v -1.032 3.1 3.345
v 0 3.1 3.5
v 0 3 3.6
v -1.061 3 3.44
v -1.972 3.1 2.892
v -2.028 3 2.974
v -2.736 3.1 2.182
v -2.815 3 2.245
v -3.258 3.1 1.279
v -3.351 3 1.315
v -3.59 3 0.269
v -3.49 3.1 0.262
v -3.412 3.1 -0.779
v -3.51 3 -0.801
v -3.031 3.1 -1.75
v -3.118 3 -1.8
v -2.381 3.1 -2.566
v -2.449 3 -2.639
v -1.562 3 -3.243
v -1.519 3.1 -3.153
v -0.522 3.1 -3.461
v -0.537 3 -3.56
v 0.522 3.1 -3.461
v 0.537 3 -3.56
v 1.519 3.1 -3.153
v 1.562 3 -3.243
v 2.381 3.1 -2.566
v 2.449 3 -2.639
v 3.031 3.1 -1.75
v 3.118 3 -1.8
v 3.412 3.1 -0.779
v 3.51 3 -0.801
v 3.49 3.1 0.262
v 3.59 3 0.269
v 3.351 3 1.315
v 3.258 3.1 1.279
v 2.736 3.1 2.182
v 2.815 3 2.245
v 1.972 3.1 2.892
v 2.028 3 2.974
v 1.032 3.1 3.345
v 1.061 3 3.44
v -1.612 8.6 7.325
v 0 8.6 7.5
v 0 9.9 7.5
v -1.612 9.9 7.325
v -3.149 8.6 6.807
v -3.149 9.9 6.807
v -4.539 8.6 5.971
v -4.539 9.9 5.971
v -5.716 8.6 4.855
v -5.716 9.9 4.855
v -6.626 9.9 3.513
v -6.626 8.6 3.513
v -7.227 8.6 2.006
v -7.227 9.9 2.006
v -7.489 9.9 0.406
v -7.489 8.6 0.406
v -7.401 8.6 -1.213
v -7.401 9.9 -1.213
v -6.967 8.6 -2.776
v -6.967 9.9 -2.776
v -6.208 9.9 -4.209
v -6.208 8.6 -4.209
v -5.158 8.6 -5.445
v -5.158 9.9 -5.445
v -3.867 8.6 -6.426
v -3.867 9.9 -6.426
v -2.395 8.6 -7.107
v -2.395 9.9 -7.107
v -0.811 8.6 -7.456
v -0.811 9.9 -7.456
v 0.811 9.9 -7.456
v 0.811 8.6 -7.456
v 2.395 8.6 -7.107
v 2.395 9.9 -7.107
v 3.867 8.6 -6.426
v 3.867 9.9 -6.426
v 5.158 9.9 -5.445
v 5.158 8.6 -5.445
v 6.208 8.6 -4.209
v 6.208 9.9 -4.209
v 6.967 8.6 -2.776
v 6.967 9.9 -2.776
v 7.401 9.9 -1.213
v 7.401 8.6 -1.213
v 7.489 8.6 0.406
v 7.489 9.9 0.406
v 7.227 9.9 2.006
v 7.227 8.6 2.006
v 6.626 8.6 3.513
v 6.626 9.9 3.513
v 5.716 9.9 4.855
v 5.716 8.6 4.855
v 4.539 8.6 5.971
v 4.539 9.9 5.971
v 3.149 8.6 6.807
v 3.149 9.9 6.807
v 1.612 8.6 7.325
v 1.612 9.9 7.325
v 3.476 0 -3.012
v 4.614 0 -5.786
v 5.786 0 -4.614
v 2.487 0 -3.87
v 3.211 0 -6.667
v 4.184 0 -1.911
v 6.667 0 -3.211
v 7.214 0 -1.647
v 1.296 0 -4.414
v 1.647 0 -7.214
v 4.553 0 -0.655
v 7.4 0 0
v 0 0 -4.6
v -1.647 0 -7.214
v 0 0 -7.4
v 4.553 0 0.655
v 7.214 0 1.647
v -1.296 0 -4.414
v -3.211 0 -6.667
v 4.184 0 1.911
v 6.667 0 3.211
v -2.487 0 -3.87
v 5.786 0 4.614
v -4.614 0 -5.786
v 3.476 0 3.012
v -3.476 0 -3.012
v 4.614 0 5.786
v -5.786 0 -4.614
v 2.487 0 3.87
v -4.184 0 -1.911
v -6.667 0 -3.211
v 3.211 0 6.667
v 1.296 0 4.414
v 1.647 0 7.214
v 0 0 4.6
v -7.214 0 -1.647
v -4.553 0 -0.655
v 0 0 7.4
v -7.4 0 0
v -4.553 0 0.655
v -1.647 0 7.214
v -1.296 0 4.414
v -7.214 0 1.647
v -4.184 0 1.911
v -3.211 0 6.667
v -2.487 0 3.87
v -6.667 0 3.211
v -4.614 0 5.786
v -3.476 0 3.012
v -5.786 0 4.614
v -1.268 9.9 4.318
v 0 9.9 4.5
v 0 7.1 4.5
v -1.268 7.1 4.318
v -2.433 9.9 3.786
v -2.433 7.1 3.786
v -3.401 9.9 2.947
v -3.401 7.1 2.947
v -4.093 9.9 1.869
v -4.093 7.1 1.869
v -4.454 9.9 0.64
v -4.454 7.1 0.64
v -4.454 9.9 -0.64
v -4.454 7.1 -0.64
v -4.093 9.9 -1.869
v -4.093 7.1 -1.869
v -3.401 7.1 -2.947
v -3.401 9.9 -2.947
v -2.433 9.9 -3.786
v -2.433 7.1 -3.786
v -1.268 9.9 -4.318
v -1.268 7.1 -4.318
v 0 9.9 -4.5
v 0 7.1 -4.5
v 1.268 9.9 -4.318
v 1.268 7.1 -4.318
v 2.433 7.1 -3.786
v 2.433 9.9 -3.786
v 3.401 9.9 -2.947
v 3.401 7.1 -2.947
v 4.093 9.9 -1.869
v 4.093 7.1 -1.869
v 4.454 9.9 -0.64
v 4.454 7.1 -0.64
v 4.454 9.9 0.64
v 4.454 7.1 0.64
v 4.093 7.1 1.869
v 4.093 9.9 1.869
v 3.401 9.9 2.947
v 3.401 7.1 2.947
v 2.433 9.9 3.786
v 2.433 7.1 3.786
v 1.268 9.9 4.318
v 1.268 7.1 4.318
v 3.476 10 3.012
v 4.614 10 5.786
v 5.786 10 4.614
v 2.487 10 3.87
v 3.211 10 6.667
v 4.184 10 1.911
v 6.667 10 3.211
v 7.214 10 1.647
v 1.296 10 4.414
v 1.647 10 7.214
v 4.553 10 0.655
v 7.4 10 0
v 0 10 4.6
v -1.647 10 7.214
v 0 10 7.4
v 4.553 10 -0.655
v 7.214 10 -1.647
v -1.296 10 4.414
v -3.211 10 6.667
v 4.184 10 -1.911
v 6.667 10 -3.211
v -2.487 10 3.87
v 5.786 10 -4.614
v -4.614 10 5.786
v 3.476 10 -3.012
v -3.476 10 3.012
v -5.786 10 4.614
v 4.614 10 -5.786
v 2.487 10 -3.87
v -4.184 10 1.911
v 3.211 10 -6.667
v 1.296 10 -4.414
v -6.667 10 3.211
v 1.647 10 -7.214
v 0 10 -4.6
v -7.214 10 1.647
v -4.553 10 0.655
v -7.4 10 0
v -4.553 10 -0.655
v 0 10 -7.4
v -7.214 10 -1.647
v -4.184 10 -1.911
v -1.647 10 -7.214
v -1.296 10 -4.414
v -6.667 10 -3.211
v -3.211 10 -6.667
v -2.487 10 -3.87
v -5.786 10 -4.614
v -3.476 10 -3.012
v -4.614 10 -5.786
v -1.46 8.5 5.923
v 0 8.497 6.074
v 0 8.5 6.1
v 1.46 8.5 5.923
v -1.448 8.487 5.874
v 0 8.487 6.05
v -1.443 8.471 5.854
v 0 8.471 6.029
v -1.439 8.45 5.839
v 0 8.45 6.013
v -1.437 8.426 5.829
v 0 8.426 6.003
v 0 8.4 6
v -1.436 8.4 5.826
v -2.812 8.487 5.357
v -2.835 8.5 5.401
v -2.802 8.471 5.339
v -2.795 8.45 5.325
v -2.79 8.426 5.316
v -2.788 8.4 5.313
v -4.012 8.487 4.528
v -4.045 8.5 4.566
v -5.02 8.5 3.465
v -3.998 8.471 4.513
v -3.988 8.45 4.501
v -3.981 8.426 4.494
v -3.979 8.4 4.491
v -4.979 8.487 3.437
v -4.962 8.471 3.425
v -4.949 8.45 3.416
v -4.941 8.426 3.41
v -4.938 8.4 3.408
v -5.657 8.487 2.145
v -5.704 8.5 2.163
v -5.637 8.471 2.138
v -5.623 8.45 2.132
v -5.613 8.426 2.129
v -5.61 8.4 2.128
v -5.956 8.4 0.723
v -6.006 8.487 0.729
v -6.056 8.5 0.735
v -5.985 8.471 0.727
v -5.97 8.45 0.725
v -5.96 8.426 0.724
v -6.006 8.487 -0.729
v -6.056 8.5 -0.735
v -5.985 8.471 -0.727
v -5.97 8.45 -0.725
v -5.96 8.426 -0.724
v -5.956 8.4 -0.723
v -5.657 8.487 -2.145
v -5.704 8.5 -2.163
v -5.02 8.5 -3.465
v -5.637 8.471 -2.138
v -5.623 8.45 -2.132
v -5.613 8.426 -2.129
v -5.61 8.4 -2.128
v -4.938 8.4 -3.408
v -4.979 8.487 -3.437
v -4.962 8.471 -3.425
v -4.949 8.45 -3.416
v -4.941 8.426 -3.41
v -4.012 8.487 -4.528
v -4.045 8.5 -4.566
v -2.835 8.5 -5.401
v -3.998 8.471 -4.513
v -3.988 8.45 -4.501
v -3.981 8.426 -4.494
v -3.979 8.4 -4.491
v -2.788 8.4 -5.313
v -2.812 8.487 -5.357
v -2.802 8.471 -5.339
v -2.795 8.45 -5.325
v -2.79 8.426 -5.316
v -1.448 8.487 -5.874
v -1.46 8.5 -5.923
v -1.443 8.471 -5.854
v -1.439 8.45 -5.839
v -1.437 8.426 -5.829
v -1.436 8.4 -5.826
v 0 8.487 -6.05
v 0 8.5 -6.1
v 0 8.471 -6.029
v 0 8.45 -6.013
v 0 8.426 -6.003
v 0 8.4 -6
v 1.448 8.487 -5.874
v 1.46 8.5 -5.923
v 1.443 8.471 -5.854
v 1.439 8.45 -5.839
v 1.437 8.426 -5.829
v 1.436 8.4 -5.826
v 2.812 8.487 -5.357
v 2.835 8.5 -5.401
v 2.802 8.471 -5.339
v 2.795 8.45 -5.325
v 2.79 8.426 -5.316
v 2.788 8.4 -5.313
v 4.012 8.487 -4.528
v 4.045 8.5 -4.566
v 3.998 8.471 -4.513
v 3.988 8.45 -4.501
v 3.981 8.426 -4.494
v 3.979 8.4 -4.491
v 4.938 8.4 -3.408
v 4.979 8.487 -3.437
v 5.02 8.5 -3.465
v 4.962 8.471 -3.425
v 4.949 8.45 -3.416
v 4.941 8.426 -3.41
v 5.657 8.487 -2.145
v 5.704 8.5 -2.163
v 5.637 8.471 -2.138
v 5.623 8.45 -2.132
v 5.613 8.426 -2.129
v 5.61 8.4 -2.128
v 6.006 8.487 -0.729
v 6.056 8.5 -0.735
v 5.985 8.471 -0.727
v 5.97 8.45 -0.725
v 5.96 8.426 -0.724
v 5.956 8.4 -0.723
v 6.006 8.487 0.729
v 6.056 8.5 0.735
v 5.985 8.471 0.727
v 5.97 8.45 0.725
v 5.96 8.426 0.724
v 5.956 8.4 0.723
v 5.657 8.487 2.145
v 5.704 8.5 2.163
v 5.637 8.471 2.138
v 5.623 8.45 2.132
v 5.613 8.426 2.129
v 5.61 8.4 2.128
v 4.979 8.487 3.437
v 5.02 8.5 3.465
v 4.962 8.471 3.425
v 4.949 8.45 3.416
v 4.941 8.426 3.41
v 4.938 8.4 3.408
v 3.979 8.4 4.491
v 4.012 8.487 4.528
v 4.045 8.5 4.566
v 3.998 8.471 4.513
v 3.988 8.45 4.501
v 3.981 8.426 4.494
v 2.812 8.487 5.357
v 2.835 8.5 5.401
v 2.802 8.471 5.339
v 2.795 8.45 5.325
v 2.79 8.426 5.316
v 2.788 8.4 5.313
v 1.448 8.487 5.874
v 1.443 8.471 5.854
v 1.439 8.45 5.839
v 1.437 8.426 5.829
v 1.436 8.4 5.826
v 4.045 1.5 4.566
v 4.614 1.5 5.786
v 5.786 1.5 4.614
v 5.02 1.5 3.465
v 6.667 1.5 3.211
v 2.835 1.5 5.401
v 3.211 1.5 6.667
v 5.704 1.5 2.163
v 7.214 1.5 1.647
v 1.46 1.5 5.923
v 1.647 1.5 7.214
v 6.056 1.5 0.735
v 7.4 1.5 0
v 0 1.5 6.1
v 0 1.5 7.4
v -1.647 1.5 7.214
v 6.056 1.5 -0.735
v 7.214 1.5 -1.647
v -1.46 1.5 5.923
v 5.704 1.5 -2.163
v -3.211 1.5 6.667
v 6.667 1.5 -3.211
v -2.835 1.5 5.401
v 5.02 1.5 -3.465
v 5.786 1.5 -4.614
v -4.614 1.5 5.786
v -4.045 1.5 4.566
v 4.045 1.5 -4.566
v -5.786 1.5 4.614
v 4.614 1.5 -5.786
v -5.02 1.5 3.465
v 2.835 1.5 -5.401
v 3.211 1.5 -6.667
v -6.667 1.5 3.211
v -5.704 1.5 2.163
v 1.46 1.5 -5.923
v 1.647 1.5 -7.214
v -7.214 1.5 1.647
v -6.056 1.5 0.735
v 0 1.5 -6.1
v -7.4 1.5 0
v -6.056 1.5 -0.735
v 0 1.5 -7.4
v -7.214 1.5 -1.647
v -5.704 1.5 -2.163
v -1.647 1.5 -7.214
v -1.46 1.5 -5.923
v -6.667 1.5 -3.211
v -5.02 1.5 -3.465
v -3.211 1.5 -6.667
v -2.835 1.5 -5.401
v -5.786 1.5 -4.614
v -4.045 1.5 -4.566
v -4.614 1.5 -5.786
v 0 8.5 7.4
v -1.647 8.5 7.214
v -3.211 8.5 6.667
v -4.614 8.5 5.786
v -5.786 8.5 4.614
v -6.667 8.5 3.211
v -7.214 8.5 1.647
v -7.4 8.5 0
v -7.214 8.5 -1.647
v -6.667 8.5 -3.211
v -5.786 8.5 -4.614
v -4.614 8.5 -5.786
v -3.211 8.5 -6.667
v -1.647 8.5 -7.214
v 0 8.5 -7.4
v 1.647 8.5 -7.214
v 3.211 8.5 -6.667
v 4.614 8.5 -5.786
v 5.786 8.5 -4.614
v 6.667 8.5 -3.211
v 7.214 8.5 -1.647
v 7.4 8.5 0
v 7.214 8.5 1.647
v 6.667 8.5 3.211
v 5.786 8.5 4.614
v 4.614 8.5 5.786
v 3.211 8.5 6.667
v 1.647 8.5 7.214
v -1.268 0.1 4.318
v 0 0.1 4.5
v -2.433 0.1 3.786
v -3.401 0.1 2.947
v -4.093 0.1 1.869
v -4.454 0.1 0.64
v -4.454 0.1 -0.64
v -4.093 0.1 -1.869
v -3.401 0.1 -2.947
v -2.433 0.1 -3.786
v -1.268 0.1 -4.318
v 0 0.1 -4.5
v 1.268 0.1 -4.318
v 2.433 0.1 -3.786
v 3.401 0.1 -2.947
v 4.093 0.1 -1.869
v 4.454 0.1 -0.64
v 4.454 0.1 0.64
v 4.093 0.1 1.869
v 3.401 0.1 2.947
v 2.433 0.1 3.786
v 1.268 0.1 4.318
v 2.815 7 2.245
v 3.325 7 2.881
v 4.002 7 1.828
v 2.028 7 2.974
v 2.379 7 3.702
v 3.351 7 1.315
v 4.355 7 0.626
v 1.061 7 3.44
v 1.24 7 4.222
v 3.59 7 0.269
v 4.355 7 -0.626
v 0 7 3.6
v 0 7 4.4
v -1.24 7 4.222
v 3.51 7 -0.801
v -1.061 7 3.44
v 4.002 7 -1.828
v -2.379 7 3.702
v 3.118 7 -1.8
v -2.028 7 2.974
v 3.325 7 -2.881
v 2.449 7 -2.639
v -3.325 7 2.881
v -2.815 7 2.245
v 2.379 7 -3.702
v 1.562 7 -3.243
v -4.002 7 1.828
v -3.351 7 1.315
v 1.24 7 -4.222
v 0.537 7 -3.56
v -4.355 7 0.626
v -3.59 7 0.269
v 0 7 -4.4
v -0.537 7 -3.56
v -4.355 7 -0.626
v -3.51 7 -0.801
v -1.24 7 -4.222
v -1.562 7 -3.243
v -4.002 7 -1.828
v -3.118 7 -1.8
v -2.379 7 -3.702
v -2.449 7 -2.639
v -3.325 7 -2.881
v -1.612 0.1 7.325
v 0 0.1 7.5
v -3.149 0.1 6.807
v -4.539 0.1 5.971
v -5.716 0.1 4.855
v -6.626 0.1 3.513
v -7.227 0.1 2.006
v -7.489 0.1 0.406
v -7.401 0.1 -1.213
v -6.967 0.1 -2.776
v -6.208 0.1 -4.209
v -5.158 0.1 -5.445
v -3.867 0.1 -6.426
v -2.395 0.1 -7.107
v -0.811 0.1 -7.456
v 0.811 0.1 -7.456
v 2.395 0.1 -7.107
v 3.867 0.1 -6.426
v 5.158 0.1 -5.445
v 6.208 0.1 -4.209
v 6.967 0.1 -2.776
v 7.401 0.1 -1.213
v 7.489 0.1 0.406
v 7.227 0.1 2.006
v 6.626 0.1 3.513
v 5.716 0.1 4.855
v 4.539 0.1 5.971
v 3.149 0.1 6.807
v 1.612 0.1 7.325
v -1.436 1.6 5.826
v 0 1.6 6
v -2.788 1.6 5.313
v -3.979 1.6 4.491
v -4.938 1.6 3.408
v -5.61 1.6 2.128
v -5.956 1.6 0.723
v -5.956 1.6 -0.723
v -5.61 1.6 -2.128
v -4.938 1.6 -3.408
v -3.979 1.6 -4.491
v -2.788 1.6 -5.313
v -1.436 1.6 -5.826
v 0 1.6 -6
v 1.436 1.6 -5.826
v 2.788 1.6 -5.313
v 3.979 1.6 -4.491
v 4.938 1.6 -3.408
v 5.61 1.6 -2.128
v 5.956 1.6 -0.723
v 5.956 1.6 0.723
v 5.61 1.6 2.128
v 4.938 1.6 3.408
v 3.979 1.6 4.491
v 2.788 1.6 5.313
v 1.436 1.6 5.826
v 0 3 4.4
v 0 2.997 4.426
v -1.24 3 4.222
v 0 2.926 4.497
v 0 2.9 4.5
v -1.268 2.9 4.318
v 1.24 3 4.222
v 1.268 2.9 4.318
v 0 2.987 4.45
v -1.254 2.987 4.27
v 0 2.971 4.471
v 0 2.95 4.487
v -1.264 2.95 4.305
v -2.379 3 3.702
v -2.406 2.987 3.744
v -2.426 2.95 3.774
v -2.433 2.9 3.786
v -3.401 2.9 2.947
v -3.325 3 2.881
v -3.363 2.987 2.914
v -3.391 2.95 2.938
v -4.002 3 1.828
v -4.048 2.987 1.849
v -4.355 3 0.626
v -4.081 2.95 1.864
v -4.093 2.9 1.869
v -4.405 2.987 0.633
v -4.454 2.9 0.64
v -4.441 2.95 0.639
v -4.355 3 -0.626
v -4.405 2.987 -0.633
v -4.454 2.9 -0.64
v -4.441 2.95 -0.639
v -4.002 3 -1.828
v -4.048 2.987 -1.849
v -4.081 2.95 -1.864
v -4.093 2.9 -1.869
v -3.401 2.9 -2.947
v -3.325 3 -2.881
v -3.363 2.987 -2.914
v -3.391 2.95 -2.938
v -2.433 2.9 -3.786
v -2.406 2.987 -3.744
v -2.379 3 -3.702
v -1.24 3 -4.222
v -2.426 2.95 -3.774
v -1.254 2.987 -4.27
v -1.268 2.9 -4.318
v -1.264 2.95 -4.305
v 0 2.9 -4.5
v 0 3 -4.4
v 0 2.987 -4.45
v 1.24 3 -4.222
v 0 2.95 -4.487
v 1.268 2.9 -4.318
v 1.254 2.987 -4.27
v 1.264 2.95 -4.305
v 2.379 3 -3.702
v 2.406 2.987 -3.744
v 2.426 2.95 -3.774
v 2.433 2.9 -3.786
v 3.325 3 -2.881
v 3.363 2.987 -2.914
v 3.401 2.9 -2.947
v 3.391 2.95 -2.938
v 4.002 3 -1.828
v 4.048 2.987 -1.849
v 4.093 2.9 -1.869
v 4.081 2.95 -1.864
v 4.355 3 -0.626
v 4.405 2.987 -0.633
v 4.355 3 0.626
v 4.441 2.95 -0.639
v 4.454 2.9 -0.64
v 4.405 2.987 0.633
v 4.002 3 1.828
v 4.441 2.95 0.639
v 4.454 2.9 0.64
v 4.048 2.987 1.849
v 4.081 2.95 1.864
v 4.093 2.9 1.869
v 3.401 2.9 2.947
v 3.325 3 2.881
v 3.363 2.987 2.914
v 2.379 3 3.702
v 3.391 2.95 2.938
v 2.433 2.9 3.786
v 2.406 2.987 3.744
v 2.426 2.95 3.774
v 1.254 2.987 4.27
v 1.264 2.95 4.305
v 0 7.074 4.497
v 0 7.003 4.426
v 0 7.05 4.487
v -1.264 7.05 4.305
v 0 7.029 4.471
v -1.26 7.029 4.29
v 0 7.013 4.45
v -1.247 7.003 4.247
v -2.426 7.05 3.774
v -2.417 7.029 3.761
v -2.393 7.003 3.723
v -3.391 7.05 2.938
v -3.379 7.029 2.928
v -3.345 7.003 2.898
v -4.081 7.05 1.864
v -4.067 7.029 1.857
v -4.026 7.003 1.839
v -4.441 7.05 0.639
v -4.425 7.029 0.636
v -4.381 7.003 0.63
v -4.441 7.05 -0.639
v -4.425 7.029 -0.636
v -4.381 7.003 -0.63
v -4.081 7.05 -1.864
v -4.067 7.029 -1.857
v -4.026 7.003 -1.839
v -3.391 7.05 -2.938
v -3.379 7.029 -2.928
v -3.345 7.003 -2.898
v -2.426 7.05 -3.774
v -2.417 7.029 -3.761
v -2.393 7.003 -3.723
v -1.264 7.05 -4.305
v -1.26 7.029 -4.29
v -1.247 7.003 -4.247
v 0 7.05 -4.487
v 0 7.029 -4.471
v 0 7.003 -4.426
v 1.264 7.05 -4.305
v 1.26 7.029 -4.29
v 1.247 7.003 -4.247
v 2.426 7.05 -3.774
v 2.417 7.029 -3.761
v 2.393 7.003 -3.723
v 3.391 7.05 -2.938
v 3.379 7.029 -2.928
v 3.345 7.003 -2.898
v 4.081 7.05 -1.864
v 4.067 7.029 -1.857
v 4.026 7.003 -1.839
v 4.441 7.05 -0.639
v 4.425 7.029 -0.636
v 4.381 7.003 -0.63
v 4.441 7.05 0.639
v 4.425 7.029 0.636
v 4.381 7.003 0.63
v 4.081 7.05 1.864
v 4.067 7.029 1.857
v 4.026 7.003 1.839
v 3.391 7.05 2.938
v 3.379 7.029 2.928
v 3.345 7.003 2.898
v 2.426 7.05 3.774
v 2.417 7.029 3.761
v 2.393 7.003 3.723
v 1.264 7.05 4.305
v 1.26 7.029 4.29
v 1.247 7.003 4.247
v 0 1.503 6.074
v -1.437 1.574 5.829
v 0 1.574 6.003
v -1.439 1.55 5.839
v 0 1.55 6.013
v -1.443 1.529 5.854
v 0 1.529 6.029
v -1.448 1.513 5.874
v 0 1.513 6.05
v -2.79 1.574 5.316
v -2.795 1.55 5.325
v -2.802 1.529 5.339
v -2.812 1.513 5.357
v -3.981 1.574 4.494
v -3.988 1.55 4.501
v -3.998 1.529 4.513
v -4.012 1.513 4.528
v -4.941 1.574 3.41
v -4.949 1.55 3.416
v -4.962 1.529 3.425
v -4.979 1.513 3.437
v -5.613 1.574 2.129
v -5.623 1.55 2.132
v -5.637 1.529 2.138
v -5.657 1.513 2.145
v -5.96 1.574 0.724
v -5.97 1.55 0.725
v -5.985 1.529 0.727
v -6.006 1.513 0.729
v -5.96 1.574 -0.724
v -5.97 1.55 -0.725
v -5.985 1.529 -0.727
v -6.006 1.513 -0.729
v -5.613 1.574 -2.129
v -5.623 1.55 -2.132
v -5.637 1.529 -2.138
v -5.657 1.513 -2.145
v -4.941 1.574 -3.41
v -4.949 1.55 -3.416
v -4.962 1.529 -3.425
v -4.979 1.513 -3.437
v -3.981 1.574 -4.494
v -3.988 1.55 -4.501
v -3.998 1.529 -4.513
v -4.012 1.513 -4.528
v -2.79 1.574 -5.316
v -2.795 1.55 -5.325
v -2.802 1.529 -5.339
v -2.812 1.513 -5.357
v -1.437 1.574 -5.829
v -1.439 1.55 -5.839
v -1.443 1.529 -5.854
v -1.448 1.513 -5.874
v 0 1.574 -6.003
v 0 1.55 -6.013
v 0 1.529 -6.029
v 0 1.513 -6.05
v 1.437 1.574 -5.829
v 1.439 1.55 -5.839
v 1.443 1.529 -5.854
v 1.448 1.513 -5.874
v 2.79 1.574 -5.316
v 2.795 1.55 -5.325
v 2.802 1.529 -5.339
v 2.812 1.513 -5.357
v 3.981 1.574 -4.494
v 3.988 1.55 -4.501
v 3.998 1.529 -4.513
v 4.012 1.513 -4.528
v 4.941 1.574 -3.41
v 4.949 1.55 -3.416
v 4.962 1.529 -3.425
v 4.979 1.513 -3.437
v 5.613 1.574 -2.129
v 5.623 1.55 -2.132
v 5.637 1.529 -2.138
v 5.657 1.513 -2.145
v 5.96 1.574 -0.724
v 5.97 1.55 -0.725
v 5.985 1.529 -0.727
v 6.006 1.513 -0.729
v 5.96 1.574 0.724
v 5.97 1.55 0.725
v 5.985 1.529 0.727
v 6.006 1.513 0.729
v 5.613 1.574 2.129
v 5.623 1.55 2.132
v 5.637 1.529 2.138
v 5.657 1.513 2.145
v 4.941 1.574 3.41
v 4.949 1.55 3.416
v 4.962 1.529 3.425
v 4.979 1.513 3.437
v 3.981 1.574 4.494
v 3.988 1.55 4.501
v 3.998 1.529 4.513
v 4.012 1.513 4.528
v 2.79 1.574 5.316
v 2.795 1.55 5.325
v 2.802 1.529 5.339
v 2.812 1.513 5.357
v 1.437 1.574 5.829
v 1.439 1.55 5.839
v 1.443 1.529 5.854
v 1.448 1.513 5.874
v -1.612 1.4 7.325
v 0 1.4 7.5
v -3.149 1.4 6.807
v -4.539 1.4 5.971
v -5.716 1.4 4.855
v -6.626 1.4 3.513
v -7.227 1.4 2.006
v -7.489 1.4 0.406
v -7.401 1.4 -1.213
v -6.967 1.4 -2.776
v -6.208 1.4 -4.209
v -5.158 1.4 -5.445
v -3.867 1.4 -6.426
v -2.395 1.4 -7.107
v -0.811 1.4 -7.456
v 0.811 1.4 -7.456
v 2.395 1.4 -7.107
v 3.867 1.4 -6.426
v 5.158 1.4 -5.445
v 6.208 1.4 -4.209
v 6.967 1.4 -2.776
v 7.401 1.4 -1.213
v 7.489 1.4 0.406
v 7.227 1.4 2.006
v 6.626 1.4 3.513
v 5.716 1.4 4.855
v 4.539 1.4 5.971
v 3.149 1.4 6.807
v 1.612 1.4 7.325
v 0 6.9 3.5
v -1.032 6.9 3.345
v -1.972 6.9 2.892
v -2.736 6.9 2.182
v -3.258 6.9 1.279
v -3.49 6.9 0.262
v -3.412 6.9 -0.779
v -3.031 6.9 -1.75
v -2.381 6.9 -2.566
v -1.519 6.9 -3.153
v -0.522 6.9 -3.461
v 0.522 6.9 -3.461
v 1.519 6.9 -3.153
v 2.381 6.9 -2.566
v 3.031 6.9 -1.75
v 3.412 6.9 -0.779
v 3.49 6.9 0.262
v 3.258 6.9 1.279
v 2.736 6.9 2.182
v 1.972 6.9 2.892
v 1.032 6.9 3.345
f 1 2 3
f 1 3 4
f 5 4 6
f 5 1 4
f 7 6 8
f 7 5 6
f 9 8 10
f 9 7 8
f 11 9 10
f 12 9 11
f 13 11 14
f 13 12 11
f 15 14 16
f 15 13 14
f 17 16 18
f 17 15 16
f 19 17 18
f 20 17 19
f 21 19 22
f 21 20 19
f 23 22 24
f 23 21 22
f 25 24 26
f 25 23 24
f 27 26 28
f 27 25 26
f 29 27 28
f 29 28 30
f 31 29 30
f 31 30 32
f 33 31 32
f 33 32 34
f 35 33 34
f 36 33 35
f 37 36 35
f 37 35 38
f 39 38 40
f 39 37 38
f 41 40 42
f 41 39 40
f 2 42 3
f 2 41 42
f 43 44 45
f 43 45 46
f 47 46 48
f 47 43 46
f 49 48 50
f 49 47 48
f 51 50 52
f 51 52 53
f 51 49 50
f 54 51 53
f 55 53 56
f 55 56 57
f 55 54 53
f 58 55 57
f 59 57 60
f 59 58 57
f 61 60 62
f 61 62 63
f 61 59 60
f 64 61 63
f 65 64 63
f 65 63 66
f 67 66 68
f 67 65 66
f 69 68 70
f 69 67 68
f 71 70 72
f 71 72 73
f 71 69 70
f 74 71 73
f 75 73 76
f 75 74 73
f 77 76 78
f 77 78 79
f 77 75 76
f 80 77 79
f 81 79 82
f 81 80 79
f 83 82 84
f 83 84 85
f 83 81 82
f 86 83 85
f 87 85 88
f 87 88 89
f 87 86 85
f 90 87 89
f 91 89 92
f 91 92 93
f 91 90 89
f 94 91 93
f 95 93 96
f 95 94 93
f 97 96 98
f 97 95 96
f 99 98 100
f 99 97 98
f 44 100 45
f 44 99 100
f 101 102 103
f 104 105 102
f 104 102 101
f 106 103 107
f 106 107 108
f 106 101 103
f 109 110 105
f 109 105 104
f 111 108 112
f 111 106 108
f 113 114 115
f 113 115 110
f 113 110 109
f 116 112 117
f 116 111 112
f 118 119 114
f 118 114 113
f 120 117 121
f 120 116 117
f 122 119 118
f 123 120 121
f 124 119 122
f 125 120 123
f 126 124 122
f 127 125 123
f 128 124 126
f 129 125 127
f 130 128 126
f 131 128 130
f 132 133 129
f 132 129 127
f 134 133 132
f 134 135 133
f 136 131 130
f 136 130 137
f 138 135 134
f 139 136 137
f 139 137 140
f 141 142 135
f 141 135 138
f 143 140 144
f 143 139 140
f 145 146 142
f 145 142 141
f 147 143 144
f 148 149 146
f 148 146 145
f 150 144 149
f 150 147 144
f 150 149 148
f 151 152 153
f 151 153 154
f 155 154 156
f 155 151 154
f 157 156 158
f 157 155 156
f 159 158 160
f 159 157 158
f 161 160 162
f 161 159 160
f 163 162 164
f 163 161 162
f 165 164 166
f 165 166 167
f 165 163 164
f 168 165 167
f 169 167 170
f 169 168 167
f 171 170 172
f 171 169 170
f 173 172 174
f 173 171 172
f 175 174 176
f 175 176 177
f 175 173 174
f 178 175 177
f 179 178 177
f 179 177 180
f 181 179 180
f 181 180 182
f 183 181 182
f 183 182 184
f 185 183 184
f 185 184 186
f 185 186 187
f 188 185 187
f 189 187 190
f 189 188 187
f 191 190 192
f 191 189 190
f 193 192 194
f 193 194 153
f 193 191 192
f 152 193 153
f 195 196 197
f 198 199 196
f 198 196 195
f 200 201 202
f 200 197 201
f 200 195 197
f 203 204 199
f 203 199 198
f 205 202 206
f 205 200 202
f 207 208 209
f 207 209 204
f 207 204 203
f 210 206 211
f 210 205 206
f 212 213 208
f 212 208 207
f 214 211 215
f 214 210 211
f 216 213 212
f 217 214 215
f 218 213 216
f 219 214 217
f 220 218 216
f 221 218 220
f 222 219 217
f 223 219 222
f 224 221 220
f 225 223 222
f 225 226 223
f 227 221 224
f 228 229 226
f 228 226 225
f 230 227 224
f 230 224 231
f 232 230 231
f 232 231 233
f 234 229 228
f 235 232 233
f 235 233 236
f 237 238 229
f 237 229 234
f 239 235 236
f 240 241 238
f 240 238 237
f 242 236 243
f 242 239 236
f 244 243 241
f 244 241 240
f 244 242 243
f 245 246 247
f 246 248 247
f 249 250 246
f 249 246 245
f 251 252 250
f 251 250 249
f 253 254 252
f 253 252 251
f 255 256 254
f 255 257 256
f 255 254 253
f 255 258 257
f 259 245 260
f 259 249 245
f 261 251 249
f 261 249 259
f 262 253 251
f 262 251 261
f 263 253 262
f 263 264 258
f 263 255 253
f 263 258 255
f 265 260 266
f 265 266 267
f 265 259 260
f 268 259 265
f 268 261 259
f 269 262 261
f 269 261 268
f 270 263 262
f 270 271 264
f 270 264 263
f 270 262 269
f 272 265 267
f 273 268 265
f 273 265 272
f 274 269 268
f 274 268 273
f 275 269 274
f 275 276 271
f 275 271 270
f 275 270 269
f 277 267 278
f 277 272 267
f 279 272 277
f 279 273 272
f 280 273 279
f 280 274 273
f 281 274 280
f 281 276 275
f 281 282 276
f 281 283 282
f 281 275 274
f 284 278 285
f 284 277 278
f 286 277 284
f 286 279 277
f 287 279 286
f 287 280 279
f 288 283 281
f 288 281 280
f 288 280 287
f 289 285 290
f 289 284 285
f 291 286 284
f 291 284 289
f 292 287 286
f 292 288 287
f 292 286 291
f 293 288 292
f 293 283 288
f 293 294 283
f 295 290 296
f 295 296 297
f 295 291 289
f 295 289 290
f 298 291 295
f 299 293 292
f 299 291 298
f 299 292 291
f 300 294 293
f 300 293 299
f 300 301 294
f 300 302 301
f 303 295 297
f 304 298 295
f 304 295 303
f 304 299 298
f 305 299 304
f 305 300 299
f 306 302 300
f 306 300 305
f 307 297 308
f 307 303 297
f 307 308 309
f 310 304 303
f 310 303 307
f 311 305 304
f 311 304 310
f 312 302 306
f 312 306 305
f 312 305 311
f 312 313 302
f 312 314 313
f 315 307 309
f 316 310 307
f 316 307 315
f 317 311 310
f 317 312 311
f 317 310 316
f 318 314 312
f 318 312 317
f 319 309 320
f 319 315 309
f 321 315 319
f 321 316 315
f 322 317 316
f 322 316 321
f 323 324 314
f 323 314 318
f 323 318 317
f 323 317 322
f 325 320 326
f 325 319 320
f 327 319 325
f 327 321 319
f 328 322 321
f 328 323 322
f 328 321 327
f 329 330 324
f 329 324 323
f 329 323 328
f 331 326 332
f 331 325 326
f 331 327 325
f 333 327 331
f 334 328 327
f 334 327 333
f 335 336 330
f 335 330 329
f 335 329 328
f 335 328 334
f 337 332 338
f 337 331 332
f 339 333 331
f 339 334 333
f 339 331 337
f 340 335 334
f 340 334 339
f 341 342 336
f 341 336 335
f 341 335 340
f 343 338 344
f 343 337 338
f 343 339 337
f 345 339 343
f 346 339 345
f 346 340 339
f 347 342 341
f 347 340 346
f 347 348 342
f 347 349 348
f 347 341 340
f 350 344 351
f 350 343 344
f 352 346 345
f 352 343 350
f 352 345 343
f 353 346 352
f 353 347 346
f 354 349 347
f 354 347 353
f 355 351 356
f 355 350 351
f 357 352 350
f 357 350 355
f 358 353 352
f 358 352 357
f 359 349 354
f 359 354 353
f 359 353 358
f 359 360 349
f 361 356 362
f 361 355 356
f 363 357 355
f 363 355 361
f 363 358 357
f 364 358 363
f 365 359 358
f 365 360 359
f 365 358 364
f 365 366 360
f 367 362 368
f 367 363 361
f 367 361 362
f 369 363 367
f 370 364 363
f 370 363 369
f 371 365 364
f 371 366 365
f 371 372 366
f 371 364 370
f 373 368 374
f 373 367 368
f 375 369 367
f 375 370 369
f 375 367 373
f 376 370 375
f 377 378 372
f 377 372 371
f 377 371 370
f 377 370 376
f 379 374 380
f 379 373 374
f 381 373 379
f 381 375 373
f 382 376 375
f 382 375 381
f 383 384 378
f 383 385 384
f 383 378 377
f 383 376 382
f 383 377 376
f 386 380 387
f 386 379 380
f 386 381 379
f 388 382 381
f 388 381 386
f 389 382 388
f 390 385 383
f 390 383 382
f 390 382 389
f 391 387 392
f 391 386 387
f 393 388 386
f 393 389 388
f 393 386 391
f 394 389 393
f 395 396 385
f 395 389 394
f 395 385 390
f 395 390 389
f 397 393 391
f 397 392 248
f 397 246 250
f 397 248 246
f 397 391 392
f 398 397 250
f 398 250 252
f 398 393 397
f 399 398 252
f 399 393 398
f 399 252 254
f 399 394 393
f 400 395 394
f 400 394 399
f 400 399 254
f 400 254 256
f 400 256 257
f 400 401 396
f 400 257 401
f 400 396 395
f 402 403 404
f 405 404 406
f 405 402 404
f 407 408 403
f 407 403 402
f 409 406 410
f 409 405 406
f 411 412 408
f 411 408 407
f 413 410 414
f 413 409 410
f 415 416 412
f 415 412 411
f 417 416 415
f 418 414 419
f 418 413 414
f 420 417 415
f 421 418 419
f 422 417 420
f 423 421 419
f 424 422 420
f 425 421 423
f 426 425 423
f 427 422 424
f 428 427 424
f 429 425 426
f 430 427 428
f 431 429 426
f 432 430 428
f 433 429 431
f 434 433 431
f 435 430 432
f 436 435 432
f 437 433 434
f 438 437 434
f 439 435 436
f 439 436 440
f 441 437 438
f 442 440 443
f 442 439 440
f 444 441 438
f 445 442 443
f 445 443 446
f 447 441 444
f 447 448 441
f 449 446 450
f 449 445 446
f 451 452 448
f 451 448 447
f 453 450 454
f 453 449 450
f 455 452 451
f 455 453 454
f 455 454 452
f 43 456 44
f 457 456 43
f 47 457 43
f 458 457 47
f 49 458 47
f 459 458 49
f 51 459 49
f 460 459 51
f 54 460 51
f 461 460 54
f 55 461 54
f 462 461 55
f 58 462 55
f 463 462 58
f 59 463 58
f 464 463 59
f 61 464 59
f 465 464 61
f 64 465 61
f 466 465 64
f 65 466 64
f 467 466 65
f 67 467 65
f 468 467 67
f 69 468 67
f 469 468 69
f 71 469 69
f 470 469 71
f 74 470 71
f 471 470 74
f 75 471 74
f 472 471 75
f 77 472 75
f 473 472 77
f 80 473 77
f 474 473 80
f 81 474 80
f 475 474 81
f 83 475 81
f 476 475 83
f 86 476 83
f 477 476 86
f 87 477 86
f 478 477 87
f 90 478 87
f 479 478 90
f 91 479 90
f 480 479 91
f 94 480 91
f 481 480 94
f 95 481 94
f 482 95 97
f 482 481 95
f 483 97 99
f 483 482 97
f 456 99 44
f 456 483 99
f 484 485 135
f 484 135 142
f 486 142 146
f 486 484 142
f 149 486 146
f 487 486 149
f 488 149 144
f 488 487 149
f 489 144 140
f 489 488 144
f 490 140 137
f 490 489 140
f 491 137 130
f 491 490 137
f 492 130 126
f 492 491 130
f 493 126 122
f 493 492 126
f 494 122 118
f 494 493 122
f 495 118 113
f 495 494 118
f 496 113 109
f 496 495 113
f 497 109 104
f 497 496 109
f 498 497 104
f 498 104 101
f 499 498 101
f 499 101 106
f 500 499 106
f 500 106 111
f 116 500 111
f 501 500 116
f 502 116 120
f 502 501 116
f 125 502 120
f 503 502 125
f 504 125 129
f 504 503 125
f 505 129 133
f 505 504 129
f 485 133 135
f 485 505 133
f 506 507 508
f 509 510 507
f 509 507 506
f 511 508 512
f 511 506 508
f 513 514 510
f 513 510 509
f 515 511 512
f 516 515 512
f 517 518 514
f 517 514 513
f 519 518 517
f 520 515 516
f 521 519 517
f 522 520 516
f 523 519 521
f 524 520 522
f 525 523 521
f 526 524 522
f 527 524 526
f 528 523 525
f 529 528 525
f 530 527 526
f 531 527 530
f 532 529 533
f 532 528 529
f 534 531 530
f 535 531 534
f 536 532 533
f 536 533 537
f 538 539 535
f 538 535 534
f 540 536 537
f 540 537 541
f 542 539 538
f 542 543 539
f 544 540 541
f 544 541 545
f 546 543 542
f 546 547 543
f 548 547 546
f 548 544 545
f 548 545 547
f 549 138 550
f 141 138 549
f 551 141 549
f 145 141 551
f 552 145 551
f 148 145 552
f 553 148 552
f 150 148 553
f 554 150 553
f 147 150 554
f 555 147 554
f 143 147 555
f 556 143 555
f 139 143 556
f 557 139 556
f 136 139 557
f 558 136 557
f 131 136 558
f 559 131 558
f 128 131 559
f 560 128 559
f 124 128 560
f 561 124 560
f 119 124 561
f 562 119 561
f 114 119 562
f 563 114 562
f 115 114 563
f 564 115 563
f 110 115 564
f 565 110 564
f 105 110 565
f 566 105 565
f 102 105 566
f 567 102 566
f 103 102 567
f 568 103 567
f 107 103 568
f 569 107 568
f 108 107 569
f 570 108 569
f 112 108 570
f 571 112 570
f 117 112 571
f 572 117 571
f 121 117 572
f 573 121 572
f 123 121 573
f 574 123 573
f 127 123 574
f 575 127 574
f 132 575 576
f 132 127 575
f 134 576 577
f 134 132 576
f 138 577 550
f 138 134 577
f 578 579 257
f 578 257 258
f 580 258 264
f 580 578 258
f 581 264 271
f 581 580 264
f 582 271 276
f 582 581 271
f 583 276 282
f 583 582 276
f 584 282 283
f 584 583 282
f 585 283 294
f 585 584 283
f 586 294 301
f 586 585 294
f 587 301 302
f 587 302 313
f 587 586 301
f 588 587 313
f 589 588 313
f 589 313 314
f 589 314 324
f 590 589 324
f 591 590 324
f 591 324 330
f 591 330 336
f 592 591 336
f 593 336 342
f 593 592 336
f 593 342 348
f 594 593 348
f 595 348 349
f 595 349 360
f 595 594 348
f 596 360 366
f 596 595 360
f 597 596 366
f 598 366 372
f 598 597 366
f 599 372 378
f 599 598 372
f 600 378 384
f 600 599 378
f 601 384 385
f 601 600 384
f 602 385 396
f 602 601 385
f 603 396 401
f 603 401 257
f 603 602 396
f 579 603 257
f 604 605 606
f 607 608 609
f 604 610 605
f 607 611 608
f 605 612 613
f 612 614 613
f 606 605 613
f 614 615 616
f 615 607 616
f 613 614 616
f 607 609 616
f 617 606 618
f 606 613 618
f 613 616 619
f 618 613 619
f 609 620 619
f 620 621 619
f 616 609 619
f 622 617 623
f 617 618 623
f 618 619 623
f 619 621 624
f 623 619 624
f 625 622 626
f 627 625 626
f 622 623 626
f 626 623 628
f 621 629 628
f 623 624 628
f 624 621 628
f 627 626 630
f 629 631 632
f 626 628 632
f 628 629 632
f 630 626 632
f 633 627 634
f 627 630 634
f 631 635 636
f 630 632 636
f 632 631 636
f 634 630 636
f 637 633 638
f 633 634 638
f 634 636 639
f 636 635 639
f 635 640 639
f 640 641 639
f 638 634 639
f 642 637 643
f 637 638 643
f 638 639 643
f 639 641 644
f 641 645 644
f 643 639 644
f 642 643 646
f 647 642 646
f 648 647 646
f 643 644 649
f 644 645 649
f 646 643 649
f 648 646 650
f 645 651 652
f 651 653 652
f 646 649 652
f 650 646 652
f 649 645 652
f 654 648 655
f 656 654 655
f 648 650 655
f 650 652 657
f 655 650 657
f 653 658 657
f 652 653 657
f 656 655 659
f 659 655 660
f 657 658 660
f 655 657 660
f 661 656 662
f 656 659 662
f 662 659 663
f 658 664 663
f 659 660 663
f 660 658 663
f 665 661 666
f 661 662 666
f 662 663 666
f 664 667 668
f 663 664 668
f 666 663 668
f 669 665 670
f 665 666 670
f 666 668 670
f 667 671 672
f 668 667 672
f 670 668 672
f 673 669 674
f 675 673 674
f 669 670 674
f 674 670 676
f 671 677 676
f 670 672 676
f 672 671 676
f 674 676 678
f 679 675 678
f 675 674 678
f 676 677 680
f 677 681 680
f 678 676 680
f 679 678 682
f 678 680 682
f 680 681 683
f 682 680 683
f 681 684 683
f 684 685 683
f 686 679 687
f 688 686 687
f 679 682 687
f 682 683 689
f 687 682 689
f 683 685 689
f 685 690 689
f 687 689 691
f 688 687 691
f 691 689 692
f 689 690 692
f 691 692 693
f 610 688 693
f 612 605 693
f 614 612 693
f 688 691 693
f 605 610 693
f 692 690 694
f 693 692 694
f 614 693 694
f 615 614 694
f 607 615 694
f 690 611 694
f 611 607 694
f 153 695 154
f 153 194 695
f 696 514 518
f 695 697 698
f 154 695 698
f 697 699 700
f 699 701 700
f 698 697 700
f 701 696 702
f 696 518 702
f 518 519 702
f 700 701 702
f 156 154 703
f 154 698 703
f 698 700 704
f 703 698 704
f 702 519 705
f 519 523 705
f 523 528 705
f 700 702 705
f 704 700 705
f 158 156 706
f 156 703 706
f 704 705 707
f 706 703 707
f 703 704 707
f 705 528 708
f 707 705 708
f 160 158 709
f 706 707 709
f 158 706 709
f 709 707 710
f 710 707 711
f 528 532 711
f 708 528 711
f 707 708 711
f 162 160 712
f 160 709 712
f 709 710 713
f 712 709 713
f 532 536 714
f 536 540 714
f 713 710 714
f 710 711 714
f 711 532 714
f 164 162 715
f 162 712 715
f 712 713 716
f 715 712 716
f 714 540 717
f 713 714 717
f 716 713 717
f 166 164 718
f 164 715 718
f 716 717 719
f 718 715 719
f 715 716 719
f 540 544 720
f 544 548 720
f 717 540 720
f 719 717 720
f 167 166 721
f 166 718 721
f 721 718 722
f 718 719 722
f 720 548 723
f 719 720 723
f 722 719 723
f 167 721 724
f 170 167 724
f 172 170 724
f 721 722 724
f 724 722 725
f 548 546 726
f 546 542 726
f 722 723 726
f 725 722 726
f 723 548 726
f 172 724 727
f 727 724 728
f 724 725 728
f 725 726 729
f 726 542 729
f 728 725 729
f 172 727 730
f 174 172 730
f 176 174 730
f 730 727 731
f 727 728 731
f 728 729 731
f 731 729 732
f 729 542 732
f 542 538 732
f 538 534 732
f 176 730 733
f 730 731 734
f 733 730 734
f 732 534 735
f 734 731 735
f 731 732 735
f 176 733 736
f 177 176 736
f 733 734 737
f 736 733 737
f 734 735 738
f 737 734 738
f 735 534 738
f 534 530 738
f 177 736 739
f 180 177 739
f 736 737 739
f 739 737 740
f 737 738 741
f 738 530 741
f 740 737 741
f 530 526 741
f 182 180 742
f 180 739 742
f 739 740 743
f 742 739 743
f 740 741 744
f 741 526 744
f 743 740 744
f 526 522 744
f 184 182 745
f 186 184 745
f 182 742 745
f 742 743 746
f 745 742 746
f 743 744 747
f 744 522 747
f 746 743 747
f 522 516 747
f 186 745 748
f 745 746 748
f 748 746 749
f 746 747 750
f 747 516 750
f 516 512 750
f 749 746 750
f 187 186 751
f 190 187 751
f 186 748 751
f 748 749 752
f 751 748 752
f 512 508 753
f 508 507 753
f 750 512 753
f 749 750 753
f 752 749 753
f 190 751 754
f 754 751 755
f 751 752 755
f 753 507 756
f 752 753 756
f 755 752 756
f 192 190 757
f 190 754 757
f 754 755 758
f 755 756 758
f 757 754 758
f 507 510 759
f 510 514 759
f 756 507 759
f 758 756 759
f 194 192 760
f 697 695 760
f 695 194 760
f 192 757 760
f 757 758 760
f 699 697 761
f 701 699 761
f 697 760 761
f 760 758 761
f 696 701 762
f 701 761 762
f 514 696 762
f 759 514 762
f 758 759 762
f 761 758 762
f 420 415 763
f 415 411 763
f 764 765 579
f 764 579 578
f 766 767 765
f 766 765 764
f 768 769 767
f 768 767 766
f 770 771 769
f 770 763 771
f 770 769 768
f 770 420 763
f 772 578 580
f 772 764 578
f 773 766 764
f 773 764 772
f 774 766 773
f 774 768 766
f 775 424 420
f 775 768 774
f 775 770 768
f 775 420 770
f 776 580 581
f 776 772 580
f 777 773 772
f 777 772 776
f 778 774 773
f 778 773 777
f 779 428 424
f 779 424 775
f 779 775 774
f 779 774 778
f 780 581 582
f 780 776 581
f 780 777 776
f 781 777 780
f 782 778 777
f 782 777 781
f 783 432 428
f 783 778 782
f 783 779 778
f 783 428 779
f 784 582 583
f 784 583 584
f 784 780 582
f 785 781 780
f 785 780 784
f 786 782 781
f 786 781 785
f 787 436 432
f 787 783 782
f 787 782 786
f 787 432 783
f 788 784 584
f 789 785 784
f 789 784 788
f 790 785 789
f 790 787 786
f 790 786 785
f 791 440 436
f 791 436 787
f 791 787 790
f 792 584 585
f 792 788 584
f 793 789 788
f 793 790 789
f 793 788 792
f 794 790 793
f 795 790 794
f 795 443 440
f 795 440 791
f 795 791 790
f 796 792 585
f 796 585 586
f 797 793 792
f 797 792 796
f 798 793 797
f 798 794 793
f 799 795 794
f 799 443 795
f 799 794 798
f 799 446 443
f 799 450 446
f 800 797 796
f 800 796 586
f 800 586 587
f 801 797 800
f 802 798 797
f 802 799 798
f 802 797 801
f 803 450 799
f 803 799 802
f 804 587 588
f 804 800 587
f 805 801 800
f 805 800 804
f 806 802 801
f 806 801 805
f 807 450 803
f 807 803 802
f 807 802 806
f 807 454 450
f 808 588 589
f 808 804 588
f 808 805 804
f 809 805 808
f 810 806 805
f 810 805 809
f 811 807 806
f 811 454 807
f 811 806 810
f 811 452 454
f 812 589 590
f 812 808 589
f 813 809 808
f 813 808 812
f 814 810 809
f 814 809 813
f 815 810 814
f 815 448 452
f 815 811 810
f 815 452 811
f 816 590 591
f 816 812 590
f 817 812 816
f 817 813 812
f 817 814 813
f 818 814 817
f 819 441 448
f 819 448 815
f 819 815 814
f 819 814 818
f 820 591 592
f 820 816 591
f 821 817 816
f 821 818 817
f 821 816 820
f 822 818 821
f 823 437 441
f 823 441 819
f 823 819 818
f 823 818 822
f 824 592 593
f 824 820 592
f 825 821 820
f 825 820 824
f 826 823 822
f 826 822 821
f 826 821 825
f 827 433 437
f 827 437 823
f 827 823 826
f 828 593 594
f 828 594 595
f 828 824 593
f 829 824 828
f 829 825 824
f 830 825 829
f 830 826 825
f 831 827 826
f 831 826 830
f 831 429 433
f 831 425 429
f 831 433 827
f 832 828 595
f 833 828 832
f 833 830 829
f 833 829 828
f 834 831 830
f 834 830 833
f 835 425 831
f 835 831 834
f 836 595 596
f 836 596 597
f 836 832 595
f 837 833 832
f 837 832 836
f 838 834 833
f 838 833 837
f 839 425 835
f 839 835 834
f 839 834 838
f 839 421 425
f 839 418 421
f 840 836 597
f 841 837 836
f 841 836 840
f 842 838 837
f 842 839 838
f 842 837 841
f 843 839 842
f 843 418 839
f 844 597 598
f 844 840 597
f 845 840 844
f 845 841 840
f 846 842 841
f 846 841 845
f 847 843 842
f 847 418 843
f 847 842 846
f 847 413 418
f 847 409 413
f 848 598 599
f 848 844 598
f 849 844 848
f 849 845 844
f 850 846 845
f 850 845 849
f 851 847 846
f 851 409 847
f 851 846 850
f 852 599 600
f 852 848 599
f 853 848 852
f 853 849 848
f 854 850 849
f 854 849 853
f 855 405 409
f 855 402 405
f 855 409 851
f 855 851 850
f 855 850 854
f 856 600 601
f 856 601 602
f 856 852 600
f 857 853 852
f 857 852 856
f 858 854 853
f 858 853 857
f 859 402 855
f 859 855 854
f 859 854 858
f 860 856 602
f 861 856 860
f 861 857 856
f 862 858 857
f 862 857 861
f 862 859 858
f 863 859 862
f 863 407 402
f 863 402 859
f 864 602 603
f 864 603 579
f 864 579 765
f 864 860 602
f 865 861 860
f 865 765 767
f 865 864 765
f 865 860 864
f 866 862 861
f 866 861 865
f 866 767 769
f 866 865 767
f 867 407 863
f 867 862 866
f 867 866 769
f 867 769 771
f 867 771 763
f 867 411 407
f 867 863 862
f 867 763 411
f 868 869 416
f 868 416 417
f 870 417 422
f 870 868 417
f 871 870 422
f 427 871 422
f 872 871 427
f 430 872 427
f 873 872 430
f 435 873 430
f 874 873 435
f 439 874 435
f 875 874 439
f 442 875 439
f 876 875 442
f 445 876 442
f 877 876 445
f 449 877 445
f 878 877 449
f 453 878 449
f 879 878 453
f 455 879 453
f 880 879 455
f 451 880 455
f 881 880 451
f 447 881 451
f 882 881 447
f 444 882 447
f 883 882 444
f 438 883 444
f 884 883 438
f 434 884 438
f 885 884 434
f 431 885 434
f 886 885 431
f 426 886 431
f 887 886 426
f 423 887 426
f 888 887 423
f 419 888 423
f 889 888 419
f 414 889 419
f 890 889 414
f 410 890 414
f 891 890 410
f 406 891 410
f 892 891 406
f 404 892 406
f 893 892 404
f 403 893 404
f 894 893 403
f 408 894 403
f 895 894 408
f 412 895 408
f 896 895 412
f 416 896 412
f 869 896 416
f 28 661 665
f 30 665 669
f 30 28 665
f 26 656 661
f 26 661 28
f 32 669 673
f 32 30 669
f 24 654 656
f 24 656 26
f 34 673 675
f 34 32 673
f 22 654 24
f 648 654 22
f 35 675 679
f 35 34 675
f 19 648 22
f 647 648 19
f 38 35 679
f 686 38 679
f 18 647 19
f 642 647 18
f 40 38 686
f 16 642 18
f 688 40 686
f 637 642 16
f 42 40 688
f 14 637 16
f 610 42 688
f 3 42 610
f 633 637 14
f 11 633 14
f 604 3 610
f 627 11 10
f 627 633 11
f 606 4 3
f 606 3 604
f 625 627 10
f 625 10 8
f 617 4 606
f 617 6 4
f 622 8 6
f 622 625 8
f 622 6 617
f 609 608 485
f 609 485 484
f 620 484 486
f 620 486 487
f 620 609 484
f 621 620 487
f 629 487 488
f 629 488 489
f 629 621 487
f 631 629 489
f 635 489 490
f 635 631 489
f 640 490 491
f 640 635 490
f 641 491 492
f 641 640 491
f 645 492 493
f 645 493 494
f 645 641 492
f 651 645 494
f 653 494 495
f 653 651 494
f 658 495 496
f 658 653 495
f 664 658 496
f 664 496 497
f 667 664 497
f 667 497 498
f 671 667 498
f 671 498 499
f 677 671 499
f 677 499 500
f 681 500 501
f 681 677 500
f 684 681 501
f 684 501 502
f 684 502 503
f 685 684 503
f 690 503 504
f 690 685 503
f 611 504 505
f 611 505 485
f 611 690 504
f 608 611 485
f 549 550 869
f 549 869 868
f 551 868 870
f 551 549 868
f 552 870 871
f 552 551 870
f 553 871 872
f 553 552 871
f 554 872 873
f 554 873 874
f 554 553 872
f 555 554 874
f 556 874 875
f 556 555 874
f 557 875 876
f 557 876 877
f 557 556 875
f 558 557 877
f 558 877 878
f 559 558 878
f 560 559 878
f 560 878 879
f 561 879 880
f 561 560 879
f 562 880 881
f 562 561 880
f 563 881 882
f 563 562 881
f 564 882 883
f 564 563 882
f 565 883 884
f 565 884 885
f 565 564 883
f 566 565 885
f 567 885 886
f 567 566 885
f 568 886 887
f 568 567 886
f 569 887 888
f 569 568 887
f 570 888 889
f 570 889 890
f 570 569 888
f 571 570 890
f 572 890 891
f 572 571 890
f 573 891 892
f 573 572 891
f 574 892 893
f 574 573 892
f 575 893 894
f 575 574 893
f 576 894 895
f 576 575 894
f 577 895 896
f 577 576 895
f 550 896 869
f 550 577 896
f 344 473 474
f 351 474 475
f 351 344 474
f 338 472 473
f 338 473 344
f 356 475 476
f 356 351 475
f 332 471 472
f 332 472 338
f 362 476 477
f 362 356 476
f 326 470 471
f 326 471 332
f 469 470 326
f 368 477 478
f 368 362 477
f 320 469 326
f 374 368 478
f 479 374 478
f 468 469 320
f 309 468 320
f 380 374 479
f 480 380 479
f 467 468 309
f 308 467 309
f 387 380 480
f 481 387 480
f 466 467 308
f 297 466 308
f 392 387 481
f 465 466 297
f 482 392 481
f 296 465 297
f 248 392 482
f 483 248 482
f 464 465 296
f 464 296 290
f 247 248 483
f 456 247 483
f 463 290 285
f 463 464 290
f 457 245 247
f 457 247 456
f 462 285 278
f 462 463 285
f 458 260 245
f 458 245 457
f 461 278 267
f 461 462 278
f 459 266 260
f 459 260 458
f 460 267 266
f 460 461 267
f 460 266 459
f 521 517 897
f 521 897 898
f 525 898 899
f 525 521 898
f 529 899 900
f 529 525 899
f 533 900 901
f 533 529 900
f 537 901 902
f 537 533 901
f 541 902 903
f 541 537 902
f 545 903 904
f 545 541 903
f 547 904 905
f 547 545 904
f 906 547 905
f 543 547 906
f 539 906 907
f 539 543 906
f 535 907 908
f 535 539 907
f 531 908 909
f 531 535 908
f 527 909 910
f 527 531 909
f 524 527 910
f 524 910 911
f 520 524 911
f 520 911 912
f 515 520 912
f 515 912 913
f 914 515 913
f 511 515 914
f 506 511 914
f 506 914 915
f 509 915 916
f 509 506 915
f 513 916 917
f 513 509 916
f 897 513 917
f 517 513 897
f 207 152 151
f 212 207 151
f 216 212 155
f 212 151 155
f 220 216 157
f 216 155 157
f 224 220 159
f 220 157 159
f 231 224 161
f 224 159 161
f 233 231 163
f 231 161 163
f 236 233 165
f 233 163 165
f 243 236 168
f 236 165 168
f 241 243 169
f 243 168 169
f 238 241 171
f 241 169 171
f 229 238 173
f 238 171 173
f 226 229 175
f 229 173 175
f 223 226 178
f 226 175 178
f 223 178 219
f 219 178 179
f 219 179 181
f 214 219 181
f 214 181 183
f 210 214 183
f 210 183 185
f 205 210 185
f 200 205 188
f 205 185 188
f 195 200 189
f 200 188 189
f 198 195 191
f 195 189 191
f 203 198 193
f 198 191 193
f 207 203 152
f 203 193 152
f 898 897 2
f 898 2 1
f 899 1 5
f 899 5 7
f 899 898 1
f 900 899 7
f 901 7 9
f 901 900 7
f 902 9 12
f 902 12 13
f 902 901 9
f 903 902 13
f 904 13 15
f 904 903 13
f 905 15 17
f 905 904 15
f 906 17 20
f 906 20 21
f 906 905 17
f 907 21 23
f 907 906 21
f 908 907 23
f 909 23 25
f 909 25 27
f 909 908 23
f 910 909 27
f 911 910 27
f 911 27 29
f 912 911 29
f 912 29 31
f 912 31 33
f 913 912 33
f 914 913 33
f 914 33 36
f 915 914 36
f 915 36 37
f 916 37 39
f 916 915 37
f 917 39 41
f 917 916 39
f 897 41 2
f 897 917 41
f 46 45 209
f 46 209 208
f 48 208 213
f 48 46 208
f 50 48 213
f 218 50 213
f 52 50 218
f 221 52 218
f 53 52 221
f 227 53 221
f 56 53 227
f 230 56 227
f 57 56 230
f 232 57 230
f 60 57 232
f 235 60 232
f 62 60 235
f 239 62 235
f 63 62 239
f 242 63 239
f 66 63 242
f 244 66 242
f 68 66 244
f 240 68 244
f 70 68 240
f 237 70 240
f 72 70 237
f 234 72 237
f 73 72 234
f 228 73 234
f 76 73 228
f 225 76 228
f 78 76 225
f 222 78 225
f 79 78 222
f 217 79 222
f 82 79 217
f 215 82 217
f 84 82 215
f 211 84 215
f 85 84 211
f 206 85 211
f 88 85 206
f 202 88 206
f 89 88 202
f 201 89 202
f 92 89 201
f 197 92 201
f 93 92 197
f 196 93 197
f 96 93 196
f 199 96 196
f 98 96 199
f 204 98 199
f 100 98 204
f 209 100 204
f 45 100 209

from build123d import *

# Parameters (mm, degrees)
ZKOSEN_1_SIZE = 0.1
ZAOBLIT1_R    = 0.1


with BuildPart() as part:
    # Skica1 → Rotovat1 (revolve)
    with BuildSketch(Plane.XY, mode=Mode.PRIVATE) as rotovat1_sk:
        Polygon((4.5, 10), (7.5, 10), (7.5, 8.5), (6, 8.5), (6, 1.5), (7.5, 1.5), (7.5, 0), (4.5, 0), (4.5, 3), (3.5, 3), (3.5, 7), (4.5, 7), align=None)
    revolve(rotovat1_sk.sketch.rotate(Axis((0, 0, 0), (0, -1, 0)), 90), axis=Axis((0, 0, 0), (0, -1, 0)))

    # Zkosení1
    zkosen_1_edges = [part.edges().sort_by_distance(p)[0] for p in [
        (0, 3, -3.5),
        (0, 0, -4.5),
        (0, 0, -7.5),
        (0, 1.5, -7.5),
        (0, 8.5, -7.5),
        (0, 10, -7.5),
        (0, 10, -4.5),
        (0, 7, -3.5),
    ]]
    chamfer(zkosen_1_edges, length=ZKOSEN_1_SIZE)

    # Zaoblit1
    zaoblit1_edges = [part.edges().sort_by_distance(p)[0] for p in [
        (0, 3, -4.5),
        (0, 1.5, -6),
        (0, 8.5, -6),
        (0, 7, -4.5),
    ]]
    fillet(zaoblit1_edges, radius=ZAOBLIT1_R)


solid = part.part
